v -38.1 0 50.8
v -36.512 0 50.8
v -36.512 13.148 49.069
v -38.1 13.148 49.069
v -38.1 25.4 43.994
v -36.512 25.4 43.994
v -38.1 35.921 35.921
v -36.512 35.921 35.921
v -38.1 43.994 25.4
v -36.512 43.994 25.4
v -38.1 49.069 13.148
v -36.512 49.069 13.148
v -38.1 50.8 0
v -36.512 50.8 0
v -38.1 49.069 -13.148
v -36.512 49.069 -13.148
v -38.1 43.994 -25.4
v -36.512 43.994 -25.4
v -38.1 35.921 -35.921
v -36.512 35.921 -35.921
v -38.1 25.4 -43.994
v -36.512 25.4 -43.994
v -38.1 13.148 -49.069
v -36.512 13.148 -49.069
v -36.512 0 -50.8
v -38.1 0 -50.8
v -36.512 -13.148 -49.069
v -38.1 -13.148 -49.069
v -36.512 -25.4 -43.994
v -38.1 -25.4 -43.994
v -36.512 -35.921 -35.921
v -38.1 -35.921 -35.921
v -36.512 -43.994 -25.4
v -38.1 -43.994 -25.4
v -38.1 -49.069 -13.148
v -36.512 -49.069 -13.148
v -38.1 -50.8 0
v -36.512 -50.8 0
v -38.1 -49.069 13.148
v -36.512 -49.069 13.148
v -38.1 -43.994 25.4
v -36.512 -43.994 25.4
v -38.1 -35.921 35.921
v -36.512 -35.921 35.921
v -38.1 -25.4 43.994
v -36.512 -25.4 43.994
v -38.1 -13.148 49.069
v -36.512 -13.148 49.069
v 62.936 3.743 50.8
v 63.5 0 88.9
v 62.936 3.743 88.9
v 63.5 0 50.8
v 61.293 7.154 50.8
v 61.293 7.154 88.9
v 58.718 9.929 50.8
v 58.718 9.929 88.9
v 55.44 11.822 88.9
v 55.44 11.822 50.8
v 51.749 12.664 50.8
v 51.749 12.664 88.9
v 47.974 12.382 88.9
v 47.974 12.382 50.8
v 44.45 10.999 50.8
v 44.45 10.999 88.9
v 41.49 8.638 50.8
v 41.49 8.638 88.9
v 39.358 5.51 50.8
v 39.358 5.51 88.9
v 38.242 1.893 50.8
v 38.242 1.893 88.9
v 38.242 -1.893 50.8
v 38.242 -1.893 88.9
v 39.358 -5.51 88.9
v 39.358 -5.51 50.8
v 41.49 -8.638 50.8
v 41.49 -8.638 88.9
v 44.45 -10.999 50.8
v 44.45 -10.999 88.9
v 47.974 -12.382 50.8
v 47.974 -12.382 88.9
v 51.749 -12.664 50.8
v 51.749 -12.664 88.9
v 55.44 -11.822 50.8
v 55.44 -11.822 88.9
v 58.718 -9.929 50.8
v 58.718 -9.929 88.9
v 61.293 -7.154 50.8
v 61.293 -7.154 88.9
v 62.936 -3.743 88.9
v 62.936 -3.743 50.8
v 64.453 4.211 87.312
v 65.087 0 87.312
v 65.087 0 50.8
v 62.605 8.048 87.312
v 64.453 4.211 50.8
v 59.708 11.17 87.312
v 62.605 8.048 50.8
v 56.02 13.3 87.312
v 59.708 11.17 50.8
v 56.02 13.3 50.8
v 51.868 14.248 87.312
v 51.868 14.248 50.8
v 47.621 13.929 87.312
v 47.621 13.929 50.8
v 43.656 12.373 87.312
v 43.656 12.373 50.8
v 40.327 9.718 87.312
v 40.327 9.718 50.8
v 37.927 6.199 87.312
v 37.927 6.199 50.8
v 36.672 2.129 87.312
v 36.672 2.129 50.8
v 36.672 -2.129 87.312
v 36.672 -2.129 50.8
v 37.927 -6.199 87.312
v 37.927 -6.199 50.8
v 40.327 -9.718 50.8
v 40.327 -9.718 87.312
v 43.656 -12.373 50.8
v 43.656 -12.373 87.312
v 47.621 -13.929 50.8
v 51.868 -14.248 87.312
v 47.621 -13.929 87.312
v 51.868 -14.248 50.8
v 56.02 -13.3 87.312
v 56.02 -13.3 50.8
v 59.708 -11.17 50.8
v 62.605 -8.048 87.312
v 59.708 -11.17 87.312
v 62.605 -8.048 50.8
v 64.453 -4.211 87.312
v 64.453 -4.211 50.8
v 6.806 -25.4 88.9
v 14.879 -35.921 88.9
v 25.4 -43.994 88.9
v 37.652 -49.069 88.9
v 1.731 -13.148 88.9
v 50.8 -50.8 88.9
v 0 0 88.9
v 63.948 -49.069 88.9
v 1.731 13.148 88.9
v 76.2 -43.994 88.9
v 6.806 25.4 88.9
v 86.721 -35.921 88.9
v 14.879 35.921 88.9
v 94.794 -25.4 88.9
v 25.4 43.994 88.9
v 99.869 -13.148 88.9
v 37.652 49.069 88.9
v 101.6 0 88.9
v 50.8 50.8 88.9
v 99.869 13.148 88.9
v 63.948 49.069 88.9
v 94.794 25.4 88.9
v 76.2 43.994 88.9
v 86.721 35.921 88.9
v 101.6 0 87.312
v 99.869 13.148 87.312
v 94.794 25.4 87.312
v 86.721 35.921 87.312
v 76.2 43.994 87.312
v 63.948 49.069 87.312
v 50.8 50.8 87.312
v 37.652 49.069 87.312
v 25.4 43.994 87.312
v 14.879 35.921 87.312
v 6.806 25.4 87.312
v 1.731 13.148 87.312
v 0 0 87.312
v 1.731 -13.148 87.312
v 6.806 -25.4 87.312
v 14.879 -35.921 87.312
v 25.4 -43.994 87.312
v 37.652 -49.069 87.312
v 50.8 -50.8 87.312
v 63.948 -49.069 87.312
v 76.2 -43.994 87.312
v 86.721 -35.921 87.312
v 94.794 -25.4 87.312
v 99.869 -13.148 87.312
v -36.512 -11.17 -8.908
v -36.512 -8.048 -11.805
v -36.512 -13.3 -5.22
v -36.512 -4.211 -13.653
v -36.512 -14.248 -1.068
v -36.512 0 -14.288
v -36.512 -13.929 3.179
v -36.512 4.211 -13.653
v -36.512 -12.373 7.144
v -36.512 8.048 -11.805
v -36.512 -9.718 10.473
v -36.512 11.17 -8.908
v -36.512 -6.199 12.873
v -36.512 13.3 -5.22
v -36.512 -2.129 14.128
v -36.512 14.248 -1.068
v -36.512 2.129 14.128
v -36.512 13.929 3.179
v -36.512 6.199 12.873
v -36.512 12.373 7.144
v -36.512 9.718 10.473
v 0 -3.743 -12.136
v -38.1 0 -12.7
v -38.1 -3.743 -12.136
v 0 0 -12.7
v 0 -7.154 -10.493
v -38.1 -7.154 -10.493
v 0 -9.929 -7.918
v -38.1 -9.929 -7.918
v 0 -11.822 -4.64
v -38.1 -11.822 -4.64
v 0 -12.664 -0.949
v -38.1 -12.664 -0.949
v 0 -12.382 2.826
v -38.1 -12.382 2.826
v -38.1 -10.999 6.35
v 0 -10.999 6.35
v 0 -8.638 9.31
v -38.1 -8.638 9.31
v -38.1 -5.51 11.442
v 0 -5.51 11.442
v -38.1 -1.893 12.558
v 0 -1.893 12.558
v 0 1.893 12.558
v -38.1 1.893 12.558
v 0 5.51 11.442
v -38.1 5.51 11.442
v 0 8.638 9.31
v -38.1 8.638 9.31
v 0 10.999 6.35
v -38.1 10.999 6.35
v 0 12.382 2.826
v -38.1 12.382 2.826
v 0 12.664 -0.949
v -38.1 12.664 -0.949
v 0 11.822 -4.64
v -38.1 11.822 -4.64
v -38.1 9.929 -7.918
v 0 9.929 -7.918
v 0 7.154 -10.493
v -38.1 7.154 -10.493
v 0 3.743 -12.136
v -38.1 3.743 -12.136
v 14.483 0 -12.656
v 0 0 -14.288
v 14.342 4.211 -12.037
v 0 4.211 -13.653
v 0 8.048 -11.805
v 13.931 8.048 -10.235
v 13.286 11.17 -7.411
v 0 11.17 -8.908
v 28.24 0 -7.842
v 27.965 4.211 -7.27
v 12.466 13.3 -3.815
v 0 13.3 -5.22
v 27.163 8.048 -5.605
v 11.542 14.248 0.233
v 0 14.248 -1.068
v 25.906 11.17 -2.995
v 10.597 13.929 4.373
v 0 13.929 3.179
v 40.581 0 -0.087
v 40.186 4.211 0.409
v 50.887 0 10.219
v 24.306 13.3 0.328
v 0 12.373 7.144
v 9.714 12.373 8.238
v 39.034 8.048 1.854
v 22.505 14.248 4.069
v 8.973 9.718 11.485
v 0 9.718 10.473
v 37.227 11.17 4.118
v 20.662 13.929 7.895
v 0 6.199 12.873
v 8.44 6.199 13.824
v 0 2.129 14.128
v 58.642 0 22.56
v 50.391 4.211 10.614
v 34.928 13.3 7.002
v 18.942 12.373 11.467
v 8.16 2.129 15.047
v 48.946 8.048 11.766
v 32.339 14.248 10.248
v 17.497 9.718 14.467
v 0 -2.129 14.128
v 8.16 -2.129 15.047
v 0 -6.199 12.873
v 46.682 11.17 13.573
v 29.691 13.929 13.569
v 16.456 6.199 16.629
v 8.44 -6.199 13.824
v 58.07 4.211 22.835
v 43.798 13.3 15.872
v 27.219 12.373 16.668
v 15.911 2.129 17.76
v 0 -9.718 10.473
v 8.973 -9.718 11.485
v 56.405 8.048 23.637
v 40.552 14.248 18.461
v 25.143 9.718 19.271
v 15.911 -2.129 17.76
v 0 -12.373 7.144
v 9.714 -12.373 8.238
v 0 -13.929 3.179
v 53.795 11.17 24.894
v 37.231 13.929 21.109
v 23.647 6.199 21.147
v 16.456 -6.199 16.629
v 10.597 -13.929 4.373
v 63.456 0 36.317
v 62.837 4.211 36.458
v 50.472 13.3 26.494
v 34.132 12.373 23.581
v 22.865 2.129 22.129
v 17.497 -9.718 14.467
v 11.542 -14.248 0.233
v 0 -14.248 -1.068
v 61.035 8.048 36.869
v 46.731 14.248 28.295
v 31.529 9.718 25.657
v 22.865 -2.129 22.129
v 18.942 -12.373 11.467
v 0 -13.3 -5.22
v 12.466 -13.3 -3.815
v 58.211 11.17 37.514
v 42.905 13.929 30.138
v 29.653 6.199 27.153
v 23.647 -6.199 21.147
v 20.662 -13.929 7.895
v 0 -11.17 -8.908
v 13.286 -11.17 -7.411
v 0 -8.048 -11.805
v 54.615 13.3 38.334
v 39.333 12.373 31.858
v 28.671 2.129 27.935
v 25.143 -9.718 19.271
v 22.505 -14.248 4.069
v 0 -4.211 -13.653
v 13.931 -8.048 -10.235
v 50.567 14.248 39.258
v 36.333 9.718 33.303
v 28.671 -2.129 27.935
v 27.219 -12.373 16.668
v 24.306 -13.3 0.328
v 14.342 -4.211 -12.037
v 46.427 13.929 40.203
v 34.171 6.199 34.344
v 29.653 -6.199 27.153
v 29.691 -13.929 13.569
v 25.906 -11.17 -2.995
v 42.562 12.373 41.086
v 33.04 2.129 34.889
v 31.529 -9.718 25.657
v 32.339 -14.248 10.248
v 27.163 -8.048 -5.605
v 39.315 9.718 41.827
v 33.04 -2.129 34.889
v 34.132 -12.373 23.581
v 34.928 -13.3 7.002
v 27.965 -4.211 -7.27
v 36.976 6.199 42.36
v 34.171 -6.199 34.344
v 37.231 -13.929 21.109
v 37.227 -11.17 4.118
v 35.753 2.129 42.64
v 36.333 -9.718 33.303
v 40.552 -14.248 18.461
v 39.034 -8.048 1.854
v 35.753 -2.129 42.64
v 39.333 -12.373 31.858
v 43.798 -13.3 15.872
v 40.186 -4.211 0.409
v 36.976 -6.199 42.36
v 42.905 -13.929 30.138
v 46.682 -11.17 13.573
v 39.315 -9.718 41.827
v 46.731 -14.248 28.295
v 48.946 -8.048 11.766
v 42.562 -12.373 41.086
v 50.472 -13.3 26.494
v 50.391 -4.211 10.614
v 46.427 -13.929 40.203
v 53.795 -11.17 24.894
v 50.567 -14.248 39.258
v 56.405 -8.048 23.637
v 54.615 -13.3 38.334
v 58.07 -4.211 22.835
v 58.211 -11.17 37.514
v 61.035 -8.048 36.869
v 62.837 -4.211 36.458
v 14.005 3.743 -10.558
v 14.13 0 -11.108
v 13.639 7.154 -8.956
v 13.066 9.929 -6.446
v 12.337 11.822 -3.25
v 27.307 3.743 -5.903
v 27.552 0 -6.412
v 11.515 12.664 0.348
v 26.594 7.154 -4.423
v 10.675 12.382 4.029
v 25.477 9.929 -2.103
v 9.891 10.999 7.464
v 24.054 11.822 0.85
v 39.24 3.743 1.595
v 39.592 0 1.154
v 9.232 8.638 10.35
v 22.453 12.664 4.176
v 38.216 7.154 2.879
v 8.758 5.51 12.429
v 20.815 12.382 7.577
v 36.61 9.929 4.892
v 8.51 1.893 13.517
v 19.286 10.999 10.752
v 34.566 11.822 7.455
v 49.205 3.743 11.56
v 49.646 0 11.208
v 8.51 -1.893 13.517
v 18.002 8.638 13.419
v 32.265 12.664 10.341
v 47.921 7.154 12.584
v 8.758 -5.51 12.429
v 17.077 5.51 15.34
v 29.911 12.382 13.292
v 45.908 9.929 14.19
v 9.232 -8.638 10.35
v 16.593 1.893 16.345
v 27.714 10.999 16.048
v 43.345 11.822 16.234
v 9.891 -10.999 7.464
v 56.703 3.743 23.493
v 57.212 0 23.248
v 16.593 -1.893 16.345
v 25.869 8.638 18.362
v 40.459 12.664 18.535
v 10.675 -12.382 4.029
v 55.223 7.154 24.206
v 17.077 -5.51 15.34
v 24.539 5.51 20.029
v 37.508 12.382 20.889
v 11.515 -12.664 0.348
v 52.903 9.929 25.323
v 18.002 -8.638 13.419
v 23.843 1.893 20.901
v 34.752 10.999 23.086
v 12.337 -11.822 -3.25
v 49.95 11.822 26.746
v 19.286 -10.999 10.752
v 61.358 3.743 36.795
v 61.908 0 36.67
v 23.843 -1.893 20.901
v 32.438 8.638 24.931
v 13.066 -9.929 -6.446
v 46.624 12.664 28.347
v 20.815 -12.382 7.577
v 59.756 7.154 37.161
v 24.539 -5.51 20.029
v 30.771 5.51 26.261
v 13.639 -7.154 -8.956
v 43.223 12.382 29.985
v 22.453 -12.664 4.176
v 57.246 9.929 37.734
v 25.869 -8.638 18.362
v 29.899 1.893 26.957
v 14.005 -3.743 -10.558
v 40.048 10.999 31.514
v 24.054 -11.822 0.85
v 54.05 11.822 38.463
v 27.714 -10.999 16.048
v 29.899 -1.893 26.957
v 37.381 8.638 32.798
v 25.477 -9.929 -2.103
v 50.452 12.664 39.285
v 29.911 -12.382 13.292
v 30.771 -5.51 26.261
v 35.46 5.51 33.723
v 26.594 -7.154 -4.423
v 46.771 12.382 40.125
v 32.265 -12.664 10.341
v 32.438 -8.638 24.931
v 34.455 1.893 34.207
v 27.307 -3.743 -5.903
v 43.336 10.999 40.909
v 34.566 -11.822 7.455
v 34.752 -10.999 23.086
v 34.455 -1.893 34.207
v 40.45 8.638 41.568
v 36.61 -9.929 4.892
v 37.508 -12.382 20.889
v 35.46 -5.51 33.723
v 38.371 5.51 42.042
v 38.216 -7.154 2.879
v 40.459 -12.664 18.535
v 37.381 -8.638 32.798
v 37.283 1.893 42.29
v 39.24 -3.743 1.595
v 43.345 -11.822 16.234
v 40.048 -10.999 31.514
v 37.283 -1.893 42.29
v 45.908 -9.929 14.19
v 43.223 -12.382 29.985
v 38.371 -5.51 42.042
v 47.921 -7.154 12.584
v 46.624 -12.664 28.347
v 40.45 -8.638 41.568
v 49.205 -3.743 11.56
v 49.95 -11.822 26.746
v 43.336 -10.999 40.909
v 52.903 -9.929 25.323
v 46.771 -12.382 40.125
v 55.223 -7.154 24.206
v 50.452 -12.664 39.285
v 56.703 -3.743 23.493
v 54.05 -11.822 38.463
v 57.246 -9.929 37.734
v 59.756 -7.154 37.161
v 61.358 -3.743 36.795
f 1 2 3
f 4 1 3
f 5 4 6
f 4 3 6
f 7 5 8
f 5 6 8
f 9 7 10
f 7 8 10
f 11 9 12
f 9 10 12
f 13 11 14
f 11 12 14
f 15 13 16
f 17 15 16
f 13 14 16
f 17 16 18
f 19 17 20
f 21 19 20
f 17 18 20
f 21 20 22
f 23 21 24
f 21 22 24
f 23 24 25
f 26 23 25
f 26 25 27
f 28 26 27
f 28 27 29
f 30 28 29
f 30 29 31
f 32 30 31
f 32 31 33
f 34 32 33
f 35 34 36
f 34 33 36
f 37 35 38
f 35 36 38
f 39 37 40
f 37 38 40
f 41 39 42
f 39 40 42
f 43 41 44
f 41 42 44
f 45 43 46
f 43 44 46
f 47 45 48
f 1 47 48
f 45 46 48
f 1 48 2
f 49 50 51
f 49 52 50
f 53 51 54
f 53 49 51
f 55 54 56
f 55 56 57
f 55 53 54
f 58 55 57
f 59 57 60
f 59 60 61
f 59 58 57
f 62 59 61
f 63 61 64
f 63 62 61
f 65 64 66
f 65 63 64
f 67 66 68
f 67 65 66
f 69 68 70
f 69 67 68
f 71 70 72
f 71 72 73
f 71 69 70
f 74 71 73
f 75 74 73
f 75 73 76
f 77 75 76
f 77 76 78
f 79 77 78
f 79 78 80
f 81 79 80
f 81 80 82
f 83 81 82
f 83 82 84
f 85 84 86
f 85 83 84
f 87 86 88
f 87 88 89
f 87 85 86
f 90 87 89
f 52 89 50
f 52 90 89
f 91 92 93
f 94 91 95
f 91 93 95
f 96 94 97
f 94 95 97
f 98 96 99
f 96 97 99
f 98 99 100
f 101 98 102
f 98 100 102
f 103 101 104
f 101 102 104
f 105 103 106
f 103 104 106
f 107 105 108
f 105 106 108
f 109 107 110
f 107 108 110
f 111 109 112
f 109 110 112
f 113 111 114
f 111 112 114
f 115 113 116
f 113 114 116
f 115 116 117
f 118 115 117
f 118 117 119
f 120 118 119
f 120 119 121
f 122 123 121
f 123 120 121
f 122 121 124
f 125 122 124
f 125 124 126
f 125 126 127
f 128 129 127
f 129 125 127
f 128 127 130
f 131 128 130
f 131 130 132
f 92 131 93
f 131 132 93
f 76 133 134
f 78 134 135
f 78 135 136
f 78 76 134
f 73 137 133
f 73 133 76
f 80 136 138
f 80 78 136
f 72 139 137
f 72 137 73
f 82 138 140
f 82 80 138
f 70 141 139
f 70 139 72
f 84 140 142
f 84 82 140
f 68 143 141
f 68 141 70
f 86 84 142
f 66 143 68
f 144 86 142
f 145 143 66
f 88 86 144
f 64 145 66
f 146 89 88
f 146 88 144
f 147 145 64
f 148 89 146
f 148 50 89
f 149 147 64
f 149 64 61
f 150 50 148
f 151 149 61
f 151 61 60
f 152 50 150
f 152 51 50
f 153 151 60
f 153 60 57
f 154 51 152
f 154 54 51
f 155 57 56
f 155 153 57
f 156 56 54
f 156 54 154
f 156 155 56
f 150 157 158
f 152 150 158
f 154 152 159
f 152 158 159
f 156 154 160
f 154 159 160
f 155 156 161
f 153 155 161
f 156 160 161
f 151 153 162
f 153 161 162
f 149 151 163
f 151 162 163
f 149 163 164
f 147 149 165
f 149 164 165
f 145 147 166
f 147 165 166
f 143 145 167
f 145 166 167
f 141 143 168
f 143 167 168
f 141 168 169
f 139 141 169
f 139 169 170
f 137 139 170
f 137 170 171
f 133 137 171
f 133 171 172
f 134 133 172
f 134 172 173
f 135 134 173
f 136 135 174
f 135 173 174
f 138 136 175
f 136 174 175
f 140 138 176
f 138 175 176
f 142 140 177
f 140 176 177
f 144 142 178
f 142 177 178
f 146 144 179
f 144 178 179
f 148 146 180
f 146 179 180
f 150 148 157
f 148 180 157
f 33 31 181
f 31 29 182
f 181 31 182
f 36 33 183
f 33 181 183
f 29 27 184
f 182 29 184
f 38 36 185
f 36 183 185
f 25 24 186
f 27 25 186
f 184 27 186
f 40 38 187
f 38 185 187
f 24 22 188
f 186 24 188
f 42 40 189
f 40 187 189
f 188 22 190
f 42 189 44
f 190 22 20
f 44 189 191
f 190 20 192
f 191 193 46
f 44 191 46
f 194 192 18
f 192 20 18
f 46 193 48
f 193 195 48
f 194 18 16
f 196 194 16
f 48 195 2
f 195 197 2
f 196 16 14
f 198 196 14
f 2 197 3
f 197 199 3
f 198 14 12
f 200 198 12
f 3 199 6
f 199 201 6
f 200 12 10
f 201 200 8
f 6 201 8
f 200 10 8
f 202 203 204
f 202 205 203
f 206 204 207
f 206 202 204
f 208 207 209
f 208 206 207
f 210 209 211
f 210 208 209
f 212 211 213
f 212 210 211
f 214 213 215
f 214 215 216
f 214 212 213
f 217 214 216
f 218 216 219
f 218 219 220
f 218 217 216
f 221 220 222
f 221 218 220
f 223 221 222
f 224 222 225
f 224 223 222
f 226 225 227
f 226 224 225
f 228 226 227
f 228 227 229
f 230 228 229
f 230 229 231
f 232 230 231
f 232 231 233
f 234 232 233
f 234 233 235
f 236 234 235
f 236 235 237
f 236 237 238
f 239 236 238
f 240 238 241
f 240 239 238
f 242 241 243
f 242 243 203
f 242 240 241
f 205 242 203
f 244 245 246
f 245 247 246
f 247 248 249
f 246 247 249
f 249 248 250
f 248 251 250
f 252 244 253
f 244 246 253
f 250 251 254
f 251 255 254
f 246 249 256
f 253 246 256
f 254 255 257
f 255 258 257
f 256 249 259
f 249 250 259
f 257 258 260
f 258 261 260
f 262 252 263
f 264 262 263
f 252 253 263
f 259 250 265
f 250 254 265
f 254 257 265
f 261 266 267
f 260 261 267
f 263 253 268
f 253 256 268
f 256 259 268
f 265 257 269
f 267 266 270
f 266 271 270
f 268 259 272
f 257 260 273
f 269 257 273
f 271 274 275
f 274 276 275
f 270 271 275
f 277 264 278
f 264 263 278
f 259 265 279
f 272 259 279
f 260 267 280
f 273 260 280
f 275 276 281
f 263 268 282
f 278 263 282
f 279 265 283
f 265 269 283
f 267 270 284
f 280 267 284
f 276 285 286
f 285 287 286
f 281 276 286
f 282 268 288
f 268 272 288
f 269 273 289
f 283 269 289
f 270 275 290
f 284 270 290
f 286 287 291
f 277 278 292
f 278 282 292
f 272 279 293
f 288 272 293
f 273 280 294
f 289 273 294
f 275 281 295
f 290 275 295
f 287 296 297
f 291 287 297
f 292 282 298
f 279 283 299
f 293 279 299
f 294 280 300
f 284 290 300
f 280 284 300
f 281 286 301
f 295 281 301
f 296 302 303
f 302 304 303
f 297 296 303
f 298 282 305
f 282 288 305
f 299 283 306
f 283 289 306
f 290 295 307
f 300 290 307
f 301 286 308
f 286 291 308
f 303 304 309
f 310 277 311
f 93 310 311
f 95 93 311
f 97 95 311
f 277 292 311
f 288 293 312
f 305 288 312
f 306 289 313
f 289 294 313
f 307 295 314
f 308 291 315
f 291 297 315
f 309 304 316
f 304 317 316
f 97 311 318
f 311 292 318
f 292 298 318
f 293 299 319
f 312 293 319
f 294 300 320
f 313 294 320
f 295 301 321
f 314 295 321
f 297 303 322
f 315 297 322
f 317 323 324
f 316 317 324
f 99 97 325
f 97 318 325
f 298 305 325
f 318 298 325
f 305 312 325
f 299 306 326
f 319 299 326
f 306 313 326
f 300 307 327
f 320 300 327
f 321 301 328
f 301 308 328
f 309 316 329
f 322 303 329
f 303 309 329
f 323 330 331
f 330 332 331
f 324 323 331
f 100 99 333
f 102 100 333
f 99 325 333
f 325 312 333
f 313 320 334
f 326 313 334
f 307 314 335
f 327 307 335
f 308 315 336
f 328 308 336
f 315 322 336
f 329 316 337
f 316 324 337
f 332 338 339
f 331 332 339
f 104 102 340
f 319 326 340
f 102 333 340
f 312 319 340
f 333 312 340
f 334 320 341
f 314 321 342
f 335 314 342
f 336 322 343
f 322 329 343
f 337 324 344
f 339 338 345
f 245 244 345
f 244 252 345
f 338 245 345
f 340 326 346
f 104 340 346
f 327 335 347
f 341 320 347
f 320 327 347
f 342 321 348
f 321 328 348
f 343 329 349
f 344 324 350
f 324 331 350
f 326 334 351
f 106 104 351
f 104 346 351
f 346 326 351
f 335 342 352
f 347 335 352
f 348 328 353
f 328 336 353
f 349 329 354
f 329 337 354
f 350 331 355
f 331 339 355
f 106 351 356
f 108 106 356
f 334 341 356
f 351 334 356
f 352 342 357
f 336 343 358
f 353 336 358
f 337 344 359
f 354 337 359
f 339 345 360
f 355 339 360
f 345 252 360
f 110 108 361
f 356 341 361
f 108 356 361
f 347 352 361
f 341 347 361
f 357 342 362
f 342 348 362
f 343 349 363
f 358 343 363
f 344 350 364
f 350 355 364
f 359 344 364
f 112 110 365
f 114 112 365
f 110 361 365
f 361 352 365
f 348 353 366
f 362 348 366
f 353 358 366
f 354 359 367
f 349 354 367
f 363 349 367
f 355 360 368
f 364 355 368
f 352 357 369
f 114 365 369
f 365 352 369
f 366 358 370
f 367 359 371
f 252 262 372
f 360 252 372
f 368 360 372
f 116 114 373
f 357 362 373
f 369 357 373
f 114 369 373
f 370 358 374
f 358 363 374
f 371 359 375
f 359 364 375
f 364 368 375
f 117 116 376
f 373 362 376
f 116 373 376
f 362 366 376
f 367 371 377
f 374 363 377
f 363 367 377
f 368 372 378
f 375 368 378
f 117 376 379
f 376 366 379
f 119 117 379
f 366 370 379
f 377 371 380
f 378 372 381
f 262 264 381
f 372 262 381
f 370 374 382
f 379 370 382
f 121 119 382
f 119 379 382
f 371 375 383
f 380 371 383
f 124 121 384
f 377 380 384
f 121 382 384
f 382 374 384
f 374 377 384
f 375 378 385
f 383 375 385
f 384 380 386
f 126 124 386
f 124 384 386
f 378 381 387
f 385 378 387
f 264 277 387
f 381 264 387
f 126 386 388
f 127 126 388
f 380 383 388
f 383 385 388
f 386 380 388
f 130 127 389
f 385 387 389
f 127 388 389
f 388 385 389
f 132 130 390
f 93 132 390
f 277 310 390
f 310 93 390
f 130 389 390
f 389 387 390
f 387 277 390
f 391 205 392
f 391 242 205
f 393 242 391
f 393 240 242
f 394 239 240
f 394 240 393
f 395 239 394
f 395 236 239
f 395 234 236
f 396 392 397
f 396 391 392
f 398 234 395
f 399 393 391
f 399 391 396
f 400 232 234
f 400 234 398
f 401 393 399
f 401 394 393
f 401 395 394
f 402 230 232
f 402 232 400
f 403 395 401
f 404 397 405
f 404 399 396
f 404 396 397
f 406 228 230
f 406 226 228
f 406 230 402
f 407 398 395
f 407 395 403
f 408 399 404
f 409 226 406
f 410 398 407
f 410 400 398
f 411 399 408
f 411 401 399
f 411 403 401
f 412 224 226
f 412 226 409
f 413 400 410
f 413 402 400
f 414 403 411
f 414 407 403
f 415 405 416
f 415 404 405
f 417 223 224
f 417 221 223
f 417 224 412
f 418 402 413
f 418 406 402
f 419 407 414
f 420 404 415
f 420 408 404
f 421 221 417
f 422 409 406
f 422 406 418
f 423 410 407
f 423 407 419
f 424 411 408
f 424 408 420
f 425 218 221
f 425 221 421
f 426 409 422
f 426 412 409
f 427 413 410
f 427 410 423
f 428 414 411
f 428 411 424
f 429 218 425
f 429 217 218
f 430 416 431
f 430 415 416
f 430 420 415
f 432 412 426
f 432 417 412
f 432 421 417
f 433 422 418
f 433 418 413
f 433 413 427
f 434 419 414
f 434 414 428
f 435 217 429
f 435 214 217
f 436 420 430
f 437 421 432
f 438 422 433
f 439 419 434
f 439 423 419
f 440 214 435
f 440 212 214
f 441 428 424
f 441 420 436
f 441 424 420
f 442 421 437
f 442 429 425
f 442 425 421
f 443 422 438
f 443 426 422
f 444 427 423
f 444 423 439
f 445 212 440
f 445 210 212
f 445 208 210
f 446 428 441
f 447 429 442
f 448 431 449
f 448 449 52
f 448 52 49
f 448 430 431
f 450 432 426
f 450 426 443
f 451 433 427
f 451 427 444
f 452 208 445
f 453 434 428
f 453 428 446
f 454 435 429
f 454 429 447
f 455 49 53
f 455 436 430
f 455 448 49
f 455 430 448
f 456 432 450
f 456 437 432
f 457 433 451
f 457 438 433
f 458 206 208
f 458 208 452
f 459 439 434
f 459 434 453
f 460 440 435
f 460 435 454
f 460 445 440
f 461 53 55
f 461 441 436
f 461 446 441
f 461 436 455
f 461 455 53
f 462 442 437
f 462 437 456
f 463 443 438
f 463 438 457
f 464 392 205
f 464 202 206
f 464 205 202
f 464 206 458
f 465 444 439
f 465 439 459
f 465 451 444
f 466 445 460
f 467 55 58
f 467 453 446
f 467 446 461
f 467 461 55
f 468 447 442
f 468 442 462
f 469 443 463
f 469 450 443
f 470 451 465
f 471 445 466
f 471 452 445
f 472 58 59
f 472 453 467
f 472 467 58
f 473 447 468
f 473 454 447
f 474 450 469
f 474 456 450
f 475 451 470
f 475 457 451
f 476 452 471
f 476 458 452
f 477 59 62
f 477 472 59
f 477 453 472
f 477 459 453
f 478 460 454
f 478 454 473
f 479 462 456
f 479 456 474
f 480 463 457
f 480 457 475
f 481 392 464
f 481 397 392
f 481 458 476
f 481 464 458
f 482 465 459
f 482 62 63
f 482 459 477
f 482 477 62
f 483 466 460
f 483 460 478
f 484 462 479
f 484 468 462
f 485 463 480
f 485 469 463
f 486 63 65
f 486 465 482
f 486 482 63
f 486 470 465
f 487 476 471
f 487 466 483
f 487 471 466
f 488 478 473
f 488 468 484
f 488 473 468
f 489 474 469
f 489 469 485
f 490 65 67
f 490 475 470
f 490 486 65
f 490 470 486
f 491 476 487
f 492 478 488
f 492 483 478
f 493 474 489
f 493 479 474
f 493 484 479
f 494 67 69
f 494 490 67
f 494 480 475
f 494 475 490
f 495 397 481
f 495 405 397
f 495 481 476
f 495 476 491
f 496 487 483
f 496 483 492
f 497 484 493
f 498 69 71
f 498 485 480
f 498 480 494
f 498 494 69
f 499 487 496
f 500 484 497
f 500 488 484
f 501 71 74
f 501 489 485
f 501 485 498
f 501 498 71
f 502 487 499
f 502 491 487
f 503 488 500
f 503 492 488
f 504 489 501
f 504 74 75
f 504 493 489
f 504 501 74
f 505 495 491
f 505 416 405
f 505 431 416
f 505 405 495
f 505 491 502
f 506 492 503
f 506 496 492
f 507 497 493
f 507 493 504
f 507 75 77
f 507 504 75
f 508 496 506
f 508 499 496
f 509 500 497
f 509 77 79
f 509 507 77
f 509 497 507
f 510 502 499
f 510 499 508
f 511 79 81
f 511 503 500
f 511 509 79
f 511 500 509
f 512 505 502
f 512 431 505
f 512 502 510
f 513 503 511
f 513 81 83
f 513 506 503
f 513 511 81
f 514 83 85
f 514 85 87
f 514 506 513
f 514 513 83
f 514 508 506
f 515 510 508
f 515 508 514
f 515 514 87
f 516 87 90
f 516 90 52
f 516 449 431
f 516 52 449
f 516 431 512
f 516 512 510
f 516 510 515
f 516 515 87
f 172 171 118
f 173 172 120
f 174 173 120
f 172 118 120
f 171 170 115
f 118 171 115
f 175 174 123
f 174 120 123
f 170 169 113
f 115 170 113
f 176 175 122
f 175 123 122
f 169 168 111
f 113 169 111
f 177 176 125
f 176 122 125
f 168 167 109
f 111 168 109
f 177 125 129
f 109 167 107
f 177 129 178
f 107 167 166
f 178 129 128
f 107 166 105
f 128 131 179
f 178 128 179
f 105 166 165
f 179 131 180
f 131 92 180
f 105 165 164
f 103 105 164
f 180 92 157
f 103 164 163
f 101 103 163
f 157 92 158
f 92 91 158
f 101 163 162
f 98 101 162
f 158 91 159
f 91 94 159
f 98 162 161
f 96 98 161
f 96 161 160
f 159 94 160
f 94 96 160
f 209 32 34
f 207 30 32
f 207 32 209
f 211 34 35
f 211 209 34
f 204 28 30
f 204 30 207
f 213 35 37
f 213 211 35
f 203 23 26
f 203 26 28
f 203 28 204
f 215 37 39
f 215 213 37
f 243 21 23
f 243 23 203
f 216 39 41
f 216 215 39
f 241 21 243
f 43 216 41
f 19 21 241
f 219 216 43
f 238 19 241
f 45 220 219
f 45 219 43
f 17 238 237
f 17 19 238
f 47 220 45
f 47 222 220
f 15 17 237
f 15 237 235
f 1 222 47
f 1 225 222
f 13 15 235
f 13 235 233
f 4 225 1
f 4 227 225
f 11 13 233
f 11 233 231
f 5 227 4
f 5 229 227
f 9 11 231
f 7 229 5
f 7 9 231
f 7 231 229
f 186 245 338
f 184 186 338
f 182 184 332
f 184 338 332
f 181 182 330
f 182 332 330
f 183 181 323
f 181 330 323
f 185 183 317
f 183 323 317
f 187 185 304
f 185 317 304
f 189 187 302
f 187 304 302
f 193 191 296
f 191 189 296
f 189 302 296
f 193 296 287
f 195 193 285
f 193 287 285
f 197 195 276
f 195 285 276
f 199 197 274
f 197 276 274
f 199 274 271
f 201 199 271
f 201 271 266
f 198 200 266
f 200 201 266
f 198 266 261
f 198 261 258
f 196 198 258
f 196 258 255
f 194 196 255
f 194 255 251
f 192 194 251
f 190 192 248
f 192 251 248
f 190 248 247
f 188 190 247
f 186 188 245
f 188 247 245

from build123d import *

# Parameters (mm, degrees)
SKETCH1_R           = 14.2875
SKETCH1_R_2         = 12.7
REVOLVE1_ANGLE      = 90
SKETCH2_R           = 14.2875
SKETCH2_R_2         = 12.7
BOSS_EXTRUDE1_DEPTH = 38.1
SKETCH3_R           = 14.2875
SKETCH3_R_2         = 12.7
BOSS_EXTRUDE2_DEPTH = 38.1
BOSS_EXTRUDE3_START = -1.5875
SKETCH4_R           = 50.8
SKETCH4_R_2         = 12.7
BOSS_EXTRUDE3_DEPTH = 1.5875
BOSS_EXTRUDE4_START = -1.5875
SKETCH5_R           = 50.8
SKETCH5_R_2         = 12.7
BOSS_EXTRUDE4_DEPTH = 1.5875


with BuildPart() as part:
    # Sketch1 → Revolve1 (revolve)
    with BuildSketch(Plane(origin=(0, 0, 0), x_dir=(0, 0, -1), z_dir=(1, 0, 0))):
        Circle(SKETCH1_R)
        Circle(SKETCH1_R_2, mode=Mode.SUBTRACT)
    revolve(axis=Axis((0, 0, 50.8), (0, -1, 0)), revolution_arc=REVOLVE1_ANGLE)

    # Sketch2 → Boss-Extrude1 (add)
    with BuildSketch(Plane.XY.offset(50.8)):
        with Locations((50.8, 0)):
            Circle(SKETCH2_R)
        with Locations((50.8, 0)):
            Circle(SKETCH2_R_2, mode=Mode.SUBTRACT)
    extrude(amount=BOSS_EXTRUDE1_DEPTH)

    # Sketch3 → Boss-Extrude2 (add)
    with BuildSketch(Plane.ZY):
        with Locations(Location((0, 0, 0), (0, 0, 180))):
            Circle(SKETCH3_R)
        with Locations(Location((0, 0, 0), (0, 0, 180))):
            Circle(SKETCH3_R_2, mode=Mode.SUBTRACT)
    extrude(amount=BOSS_EXTRUDE2_DEPTH)

    # Sketch4 → Boss-Extrude3 (add)
    with BuildSketch(Plane.ZY.offset(38.1).offset(BOSS_EXTRUDE3_START)):
        Circle(SKETCH4_R)
        with Locations(Location((0, 0, 0), (0, 0, 180))):
            Circle(SKETCH4_R_2, mode=Mode.SUBTRACT)
    extrude(amount=BOSS_EXTRUDE3_DEPTH)

    # Sketch5 → Boss-Extrude4 (add)
    with BuildSketch(Plane.XY.offset(88.9).offset(BOSS_EXTRUDE4_START)):
        with Locations((50.8, 0)):
            Circle(SKETCH5_R)
        with Locations((50.8, 0)):
            Circle(SKETCH5_R_2, mode=Mode.SUBTRACT)
    extrude(amount=BOSS_EXTRUDE4_DEPTH)


solid = part.part
